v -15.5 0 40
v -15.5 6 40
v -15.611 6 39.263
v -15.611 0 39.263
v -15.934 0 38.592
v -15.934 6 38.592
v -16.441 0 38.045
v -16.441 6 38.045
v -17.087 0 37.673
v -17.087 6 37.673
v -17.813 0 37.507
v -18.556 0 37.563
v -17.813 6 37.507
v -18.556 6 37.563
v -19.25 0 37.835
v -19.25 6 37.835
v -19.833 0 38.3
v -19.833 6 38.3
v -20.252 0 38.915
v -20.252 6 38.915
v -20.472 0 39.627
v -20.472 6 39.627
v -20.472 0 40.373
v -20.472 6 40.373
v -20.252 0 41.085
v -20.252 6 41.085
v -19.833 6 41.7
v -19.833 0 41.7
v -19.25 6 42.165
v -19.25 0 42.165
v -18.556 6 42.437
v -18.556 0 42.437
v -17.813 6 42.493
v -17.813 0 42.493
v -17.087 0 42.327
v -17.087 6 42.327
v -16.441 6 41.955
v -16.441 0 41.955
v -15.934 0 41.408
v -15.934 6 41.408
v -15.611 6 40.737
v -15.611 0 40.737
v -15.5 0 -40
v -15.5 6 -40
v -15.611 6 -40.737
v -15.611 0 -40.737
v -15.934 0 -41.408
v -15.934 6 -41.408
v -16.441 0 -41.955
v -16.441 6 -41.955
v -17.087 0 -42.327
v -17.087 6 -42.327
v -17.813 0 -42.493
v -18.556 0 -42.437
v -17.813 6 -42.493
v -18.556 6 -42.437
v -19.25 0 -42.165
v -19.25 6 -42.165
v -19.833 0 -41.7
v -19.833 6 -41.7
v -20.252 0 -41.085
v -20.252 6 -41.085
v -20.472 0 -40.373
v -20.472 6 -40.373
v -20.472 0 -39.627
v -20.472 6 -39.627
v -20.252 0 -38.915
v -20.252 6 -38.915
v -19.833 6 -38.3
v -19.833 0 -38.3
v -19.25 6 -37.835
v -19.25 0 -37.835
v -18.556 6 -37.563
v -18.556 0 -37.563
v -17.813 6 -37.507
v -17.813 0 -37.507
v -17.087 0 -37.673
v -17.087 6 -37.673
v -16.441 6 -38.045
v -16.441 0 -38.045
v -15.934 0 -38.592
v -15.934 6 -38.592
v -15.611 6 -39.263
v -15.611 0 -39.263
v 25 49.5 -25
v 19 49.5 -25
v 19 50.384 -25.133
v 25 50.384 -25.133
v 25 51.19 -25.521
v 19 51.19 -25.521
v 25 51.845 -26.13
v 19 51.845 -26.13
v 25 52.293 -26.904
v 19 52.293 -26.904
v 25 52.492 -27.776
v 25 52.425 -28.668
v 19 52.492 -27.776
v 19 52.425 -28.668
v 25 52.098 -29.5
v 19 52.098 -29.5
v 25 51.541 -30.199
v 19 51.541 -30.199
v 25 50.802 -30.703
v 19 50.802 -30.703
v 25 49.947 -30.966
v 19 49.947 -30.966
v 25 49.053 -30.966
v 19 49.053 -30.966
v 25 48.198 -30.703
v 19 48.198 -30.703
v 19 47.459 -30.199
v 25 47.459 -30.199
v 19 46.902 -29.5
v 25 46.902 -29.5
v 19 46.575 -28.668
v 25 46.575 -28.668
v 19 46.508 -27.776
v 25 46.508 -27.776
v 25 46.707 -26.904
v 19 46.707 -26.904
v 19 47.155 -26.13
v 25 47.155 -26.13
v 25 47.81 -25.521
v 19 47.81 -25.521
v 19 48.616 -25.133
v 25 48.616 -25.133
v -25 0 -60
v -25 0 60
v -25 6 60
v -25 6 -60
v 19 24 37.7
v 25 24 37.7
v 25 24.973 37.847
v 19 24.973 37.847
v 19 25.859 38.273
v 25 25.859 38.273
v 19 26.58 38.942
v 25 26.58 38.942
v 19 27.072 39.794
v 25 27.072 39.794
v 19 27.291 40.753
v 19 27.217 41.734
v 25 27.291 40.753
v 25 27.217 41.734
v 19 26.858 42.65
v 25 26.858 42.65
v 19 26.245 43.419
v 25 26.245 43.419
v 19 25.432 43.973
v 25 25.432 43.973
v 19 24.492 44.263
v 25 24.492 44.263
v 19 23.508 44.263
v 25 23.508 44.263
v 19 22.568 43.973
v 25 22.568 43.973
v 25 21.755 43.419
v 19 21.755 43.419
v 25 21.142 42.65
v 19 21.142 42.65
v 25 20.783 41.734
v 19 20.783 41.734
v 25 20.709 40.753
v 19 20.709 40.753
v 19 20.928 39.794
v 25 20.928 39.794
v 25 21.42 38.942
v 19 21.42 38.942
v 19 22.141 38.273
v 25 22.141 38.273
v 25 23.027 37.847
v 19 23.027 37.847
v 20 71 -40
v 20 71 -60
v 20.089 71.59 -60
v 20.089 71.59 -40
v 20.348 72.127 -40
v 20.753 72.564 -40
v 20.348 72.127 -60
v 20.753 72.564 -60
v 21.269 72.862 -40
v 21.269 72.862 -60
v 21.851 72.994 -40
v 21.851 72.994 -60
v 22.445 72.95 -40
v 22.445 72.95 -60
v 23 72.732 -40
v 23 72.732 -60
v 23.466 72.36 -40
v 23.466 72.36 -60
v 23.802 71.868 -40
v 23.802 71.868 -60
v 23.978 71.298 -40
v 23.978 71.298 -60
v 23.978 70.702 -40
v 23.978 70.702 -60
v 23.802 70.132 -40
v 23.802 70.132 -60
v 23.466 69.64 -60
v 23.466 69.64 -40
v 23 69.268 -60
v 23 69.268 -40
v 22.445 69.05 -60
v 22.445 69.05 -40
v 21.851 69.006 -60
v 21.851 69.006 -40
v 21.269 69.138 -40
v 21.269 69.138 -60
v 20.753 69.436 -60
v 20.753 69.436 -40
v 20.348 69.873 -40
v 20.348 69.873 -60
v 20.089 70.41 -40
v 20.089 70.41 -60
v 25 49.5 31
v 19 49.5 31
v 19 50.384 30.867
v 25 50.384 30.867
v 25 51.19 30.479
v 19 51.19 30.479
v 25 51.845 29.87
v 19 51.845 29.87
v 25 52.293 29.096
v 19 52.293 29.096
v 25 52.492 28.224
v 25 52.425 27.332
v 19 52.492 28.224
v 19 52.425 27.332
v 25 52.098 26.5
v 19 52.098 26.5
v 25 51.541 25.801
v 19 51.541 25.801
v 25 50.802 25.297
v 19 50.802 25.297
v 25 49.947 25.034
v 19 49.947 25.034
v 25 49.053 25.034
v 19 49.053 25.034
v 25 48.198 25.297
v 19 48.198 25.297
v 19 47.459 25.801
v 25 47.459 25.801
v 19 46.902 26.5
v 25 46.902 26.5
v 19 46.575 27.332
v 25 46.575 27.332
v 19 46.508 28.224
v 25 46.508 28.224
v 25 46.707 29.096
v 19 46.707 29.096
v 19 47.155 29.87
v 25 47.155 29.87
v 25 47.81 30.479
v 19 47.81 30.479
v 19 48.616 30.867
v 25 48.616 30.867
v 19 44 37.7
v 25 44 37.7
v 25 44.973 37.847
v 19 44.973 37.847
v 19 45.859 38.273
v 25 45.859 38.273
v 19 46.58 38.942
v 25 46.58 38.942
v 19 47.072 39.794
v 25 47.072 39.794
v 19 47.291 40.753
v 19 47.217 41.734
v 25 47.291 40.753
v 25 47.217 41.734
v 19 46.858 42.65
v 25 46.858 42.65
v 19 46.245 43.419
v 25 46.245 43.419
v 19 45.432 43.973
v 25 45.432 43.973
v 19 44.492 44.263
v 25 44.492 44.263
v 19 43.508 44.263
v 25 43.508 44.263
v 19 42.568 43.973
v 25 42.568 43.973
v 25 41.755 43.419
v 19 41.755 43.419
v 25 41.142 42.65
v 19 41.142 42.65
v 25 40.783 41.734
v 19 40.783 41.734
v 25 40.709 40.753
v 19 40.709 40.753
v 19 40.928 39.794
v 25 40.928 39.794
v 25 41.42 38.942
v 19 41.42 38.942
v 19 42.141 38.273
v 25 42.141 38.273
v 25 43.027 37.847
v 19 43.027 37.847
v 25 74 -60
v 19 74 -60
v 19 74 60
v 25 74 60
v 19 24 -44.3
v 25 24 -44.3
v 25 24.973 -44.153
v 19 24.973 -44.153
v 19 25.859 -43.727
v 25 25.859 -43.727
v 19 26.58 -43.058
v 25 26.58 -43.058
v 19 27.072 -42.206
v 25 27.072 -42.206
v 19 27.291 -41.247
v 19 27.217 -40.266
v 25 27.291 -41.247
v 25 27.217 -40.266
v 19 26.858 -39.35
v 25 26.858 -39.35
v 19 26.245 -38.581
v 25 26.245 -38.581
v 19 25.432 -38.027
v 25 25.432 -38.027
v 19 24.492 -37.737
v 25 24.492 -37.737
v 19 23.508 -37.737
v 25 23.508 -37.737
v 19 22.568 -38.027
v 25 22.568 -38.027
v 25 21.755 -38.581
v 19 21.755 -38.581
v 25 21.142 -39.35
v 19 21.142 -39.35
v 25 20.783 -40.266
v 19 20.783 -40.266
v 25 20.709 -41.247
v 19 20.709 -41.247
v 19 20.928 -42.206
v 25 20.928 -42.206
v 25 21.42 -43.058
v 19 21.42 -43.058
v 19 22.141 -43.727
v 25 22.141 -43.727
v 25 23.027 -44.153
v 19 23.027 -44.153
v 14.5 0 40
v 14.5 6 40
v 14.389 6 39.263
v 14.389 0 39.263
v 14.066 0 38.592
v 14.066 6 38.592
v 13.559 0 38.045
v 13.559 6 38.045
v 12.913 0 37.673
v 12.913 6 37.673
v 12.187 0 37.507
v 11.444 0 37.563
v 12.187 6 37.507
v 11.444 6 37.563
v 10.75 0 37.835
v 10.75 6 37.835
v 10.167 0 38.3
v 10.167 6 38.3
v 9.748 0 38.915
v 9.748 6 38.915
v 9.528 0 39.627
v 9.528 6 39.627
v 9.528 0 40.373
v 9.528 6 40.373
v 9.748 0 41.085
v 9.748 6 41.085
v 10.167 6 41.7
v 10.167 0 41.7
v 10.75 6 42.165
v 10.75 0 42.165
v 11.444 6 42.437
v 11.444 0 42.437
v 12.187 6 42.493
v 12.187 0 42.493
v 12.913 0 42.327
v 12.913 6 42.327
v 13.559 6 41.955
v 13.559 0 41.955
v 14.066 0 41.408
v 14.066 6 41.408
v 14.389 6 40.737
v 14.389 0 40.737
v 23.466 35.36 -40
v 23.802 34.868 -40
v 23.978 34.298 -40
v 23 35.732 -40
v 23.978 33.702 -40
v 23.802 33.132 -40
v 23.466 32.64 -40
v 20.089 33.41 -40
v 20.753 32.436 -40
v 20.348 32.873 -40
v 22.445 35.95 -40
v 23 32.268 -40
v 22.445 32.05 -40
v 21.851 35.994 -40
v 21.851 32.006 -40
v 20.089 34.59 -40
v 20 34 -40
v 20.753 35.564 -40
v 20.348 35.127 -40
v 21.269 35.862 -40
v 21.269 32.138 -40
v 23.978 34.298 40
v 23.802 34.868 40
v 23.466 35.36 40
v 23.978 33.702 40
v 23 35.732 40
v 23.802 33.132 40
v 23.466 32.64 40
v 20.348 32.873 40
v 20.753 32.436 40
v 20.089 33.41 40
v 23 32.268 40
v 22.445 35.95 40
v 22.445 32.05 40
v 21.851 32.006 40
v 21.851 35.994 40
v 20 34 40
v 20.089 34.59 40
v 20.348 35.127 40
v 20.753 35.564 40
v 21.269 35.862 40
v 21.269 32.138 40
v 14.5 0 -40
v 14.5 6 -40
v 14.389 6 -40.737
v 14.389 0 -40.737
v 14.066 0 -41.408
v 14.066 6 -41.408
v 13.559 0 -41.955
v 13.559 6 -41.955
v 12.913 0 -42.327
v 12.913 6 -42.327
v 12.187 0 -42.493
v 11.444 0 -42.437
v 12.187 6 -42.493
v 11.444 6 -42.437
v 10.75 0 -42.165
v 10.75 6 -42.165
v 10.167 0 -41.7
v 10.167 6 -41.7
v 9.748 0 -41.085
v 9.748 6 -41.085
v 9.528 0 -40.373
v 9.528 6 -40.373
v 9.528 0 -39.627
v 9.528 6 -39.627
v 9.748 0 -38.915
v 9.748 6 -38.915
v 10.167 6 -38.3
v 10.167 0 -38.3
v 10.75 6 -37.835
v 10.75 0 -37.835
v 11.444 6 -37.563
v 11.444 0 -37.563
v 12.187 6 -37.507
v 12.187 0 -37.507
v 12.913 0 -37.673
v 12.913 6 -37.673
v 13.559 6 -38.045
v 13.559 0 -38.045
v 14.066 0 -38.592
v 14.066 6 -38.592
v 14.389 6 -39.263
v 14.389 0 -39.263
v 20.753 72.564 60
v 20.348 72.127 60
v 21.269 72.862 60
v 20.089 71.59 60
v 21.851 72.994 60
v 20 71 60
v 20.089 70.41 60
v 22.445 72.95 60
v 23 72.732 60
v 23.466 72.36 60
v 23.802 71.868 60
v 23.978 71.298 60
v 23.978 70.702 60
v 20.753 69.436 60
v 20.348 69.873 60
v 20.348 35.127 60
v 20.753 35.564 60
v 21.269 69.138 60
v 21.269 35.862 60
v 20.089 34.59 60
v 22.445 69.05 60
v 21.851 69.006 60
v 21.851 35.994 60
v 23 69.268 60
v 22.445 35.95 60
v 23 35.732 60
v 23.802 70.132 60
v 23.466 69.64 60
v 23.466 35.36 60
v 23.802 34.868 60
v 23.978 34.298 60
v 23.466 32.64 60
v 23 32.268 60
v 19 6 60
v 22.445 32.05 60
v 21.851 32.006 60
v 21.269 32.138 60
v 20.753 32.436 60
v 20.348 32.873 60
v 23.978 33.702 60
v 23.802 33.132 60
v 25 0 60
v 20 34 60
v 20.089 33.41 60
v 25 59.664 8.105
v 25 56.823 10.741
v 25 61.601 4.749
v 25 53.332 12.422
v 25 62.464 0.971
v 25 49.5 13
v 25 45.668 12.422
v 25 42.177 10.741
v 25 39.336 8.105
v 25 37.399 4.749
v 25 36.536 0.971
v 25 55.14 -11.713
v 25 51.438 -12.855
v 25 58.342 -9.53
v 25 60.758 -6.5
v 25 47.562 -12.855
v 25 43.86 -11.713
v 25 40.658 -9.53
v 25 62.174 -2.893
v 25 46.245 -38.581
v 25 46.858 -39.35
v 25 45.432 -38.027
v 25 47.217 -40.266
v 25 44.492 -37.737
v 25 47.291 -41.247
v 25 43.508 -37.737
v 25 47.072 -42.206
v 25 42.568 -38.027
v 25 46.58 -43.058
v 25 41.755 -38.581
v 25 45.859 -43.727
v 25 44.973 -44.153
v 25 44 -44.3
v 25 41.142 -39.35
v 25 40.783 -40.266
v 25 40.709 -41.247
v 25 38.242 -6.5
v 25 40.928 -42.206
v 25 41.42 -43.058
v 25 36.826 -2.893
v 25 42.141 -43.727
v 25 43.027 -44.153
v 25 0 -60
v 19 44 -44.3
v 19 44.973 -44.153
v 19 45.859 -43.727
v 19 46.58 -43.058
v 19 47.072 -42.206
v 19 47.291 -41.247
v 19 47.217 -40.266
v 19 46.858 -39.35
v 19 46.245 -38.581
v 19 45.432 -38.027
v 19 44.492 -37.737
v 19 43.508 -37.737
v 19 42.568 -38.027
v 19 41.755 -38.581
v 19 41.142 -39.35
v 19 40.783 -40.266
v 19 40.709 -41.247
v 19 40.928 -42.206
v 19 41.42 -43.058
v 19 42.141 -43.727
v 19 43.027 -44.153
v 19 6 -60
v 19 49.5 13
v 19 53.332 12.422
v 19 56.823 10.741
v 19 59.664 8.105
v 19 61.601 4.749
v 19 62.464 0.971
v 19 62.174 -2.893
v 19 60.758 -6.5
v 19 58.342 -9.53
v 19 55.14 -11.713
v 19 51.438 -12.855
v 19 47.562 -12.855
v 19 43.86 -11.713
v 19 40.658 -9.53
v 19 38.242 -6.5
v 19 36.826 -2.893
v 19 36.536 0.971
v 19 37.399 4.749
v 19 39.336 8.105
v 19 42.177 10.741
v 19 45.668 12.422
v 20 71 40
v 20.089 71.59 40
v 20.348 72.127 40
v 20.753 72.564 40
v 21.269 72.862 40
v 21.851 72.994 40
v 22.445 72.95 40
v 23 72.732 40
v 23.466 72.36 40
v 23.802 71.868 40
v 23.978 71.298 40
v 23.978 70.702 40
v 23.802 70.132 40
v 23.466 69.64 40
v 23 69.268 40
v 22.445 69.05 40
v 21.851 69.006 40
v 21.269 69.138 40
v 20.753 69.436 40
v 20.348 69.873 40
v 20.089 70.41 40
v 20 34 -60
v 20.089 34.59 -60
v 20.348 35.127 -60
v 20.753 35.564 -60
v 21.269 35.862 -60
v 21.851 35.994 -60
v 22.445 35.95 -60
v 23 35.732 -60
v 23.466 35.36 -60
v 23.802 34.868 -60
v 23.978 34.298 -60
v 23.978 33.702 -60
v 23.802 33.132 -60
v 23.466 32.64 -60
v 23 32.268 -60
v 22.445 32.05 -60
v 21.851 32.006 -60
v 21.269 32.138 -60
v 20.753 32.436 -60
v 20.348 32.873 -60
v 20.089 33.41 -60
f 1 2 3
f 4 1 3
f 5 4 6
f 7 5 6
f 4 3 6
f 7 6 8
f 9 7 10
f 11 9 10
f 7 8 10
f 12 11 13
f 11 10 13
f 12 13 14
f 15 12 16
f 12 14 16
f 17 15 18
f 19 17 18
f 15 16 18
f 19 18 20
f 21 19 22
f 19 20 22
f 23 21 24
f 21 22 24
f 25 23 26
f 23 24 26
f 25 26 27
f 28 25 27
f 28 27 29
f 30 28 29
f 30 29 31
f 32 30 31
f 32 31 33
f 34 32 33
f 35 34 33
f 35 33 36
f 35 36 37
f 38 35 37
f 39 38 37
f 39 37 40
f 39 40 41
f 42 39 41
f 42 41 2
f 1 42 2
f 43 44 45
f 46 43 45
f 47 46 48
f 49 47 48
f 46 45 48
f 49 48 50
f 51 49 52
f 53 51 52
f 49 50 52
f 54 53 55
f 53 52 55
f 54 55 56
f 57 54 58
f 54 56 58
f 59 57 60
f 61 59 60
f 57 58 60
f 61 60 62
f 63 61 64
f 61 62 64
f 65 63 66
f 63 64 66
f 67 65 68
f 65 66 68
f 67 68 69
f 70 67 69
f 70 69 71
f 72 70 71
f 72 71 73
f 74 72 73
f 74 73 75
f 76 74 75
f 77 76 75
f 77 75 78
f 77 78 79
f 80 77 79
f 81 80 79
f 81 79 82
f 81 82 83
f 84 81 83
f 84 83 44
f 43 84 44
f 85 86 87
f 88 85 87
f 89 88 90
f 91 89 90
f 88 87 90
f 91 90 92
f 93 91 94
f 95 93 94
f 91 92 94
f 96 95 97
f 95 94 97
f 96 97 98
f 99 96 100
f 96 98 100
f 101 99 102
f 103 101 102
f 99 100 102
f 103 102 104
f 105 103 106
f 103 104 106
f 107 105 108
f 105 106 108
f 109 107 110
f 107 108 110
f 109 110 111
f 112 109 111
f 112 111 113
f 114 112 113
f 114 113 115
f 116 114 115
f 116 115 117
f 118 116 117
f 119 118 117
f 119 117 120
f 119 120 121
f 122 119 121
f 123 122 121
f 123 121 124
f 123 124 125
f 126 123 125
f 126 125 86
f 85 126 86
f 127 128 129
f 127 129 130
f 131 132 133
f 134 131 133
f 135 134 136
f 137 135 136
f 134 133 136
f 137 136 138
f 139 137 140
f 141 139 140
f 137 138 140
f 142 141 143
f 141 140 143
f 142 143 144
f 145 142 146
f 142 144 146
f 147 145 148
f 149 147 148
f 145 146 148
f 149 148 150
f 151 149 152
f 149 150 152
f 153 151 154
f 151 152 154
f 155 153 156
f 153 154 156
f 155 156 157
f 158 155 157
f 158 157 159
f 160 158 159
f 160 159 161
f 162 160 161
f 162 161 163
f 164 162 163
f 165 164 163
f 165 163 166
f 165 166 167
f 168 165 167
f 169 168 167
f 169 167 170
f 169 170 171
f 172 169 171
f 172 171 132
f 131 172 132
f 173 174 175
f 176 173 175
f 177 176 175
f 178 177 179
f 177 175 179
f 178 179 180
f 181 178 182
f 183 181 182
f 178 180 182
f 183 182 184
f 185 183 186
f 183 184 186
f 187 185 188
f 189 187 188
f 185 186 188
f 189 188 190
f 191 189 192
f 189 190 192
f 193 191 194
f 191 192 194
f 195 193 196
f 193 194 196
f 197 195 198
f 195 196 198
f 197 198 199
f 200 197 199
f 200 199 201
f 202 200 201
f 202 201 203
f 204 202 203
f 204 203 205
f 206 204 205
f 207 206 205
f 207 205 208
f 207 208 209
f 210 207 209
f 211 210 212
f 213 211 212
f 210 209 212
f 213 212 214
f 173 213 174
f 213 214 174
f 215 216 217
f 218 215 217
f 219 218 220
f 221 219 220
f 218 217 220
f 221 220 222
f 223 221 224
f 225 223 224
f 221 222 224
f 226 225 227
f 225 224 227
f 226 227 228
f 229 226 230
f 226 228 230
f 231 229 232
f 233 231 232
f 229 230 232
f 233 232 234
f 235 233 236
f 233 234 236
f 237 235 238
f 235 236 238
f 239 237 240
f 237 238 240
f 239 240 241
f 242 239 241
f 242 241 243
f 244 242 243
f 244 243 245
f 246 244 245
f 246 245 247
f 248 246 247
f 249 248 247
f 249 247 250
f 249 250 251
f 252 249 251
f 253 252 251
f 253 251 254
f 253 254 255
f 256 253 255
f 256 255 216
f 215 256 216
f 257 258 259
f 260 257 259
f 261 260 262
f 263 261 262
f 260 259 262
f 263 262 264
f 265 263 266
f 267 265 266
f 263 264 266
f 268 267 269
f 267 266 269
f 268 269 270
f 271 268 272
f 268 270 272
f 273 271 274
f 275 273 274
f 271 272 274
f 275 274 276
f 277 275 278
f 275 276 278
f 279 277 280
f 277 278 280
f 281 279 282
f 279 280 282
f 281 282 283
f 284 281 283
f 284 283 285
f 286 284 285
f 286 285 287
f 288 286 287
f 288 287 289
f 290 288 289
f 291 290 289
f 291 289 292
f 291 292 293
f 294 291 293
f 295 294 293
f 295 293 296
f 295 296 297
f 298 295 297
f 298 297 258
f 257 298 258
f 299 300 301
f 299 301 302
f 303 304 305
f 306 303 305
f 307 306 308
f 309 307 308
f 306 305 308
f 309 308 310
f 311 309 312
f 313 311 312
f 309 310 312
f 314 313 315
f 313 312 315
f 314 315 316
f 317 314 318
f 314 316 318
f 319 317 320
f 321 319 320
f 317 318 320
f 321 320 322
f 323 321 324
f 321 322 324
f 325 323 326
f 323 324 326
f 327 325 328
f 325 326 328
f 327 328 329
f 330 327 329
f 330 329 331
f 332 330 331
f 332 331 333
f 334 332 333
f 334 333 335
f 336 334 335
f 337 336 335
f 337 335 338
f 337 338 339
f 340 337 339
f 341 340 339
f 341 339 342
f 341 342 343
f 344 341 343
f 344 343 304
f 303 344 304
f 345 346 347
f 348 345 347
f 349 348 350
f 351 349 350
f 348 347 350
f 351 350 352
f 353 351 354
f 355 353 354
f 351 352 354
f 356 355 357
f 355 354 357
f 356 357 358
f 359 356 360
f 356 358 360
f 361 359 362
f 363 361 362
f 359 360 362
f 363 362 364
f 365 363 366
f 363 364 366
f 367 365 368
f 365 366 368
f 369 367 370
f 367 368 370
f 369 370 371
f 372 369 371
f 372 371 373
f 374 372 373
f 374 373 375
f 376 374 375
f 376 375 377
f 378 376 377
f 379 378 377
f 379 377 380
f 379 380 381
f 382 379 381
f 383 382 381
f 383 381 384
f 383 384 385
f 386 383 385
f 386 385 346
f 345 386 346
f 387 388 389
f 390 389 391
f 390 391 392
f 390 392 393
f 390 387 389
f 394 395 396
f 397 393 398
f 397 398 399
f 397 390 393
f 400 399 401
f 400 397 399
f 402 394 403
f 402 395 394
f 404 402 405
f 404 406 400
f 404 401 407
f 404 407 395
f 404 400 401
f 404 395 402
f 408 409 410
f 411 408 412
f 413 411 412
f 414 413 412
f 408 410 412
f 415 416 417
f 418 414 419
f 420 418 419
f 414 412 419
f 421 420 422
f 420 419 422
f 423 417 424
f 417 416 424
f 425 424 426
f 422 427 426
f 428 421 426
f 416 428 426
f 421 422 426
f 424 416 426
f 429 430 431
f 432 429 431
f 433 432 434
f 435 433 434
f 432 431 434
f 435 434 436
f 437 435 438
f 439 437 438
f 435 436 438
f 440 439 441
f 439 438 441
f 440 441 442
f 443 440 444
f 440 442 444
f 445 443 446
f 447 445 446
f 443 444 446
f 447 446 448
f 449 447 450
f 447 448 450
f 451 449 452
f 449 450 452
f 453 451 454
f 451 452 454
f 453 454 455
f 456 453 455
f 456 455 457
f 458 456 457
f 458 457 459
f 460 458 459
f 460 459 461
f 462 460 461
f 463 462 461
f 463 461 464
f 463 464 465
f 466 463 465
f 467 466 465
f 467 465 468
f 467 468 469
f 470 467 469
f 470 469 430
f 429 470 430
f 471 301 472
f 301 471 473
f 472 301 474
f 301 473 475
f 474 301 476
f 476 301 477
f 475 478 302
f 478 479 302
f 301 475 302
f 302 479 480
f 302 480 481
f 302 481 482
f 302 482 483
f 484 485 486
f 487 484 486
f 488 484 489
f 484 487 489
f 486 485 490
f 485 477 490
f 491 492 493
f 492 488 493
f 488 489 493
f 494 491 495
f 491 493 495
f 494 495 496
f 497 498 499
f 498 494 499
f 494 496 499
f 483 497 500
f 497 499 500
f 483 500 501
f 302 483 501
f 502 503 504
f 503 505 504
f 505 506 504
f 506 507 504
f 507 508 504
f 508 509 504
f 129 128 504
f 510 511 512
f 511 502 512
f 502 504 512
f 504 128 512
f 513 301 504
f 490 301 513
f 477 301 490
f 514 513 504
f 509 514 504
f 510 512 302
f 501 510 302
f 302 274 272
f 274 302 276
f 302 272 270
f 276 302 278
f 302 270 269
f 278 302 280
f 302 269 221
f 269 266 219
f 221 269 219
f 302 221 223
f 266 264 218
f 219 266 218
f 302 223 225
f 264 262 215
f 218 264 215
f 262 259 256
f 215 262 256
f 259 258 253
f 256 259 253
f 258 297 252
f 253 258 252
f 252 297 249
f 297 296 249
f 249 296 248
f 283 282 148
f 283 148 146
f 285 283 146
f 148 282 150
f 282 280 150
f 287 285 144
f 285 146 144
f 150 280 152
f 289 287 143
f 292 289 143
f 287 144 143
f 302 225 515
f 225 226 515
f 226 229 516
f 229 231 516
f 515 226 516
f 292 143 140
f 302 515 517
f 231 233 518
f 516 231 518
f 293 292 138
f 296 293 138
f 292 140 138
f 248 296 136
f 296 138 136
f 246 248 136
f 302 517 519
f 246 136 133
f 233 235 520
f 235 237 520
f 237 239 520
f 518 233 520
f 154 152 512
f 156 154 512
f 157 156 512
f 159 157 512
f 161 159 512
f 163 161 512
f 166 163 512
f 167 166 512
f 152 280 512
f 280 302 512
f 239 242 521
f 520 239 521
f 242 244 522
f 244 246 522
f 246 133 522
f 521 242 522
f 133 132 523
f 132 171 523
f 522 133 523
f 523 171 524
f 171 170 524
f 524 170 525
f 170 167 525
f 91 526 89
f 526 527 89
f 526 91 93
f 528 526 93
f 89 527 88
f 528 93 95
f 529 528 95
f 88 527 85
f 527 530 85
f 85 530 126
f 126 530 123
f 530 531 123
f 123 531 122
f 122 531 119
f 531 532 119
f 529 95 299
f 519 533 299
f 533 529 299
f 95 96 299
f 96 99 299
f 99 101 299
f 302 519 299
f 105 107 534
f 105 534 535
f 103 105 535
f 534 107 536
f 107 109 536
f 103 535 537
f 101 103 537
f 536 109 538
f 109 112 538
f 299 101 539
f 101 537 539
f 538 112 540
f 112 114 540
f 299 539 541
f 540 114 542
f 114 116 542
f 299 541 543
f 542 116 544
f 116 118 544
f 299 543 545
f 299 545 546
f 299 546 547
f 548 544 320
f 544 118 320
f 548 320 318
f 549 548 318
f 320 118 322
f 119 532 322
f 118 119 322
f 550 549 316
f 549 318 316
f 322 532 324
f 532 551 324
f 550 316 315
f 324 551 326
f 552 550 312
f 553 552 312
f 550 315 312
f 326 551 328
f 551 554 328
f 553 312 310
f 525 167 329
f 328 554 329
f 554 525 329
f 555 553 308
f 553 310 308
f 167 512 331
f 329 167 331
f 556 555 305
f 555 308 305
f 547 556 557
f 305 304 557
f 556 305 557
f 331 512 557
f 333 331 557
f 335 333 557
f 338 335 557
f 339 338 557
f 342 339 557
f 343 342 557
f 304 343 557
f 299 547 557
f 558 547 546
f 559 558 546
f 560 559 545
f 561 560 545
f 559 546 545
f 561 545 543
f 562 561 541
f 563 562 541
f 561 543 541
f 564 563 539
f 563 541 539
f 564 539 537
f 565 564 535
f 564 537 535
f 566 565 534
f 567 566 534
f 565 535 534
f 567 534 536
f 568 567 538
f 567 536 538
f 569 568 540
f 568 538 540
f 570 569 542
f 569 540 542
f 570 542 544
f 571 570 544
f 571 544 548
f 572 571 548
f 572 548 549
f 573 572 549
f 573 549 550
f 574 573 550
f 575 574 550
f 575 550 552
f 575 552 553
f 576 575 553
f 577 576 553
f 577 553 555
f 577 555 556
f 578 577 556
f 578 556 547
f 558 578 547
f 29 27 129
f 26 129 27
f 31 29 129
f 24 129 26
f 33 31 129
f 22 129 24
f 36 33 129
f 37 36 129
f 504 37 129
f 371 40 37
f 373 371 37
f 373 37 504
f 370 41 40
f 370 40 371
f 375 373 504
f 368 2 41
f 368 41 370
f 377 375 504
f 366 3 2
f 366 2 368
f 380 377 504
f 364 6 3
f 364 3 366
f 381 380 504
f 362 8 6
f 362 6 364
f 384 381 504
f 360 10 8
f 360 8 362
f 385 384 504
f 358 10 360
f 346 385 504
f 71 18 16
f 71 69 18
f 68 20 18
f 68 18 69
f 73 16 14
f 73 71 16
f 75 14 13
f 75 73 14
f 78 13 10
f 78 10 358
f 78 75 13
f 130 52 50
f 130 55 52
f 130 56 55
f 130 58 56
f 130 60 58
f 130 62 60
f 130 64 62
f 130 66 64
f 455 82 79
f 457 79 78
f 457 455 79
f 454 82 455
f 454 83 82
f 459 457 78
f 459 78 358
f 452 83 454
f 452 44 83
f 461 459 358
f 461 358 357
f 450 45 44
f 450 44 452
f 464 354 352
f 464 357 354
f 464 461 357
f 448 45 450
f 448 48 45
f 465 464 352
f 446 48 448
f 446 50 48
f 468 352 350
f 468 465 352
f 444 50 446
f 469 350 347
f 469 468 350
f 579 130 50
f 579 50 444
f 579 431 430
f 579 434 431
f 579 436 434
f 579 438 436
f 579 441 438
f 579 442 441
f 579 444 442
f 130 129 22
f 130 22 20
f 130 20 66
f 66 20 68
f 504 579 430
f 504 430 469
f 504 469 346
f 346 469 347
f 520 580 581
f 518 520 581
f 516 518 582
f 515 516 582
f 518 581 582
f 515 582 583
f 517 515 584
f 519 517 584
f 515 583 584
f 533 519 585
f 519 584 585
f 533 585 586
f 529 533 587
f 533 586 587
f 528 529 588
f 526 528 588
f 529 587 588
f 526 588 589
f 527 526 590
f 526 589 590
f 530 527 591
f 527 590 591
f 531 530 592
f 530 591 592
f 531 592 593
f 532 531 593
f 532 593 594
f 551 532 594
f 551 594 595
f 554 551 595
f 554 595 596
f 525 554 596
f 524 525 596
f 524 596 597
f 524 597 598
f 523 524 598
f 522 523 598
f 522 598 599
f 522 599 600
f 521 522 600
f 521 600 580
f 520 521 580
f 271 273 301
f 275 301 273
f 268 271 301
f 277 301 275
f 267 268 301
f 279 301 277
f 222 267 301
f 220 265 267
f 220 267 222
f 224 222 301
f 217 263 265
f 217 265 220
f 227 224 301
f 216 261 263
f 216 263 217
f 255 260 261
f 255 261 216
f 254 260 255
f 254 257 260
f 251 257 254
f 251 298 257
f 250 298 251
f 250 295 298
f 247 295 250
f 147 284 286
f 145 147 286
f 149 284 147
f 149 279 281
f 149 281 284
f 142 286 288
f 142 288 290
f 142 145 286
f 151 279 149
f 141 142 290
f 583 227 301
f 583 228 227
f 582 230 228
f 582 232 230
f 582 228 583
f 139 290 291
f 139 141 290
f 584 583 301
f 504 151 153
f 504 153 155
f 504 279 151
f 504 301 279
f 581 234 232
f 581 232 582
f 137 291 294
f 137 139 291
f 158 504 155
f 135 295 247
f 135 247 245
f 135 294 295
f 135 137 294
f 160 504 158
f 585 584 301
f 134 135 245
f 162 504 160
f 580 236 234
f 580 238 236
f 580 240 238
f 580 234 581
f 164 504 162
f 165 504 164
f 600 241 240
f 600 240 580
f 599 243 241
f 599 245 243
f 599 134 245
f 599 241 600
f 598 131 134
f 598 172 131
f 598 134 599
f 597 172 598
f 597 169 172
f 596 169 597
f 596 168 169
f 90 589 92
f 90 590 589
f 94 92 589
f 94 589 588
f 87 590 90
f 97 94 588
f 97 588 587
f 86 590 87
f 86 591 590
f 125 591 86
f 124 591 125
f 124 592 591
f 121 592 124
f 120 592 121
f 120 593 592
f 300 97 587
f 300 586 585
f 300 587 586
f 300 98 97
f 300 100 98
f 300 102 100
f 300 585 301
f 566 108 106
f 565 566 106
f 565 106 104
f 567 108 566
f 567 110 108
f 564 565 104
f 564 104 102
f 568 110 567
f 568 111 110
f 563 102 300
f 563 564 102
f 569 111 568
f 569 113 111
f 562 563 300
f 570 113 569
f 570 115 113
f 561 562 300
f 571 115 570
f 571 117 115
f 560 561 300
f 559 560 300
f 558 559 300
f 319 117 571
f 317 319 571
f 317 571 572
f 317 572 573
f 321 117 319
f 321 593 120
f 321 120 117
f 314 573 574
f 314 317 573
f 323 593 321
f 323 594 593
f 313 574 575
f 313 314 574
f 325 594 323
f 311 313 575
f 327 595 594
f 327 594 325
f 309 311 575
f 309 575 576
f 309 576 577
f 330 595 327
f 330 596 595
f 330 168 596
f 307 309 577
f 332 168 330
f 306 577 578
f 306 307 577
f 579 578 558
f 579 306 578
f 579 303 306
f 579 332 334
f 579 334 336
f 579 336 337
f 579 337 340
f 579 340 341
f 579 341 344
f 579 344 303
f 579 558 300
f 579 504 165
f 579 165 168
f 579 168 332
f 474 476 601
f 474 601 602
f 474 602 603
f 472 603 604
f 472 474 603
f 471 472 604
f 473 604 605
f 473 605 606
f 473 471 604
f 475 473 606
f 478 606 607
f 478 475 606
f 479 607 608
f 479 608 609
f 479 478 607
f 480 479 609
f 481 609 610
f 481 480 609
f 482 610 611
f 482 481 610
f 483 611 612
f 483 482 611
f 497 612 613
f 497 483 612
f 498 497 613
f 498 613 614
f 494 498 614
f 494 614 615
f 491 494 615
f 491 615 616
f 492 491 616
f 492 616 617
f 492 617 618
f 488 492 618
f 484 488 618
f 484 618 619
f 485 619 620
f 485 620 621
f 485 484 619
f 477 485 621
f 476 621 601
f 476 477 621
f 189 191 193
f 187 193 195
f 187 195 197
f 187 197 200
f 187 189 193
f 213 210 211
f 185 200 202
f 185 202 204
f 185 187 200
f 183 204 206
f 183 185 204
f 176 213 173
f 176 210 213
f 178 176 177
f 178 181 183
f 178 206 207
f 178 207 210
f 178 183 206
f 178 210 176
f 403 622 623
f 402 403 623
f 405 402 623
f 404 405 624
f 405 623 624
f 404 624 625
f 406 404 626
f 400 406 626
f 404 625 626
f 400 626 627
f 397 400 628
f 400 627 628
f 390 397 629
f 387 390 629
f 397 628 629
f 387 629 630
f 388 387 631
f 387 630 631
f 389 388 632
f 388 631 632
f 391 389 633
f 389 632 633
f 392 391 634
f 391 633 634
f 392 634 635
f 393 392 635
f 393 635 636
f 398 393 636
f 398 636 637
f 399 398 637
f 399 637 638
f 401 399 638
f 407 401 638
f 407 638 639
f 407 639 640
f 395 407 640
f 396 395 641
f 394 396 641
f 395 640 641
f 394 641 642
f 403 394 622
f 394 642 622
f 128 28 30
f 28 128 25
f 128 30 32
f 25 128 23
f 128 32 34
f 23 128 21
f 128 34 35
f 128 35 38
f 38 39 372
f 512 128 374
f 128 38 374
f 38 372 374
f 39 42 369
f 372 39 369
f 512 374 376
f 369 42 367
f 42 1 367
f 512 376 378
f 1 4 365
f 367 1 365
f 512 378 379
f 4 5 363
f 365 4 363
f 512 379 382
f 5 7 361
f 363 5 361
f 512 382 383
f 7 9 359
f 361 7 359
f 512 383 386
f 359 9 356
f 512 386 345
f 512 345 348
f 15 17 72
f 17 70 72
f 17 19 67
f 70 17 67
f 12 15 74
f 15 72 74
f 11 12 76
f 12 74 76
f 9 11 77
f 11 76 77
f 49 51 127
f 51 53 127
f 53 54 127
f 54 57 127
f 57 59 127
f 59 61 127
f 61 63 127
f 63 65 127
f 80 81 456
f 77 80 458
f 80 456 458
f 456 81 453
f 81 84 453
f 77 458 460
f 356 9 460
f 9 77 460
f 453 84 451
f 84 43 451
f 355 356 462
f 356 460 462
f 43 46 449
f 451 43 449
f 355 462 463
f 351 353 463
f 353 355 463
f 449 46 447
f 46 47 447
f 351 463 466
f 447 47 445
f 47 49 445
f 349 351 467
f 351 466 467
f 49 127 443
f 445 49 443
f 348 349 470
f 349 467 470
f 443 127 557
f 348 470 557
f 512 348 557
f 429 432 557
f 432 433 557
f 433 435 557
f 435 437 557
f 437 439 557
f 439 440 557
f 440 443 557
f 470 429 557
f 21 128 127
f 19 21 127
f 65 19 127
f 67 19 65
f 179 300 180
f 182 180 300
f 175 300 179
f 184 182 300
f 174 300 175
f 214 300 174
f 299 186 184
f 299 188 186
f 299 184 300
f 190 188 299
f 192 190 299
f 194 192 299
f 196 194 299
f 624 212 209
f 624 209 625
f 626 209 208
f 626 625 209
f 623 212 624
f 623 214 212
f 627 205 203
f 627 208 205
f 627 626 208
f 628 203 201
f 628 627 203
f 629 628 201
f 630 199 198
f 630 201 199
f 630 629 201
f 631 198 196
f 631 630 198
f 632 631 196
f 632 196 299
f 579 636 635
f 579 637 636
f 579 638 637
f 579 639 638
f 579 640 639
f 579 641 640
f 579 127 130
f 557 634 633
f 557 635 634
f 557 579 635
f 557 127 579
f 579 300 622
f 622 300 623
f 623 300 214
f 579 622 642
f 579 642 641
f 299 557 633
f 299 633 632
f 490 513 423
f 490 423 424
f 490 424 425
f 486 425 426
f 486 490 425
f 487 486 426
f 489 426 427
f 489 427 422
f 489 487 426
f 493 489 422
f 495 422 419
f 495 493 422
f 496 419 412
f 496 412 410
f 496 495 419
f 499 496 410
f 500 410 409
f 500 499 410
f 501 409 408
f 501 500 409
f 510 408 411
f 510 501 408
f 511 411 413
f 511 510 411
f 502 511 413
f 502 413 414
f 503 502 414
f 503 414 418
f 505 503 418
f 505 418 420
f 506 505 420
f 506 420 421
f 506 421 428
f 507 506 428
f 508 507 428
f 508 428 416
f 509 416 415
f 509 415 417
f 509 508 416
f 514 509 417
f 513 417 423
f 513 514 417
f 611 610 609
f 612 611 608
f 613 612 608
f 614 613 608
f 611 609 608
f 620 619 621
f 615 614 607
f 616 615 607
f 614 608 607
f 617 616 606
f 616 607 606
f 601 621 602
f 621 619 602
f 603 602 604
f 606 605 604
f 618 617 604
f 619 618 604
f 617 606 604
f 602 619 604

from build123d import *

# Parameters (mm, degrees)
SKETCH_1_W          = 44
SKETCH_1_H          = 120
EXTRUDE_1_DEPTH     = 6
SKETCH_1_3_W        = 6
SKETCH_1_3_H        = 120
EXTRUDE_2_DEPTH     = 74
SKETCH_2_R          = 13
SKETCH_2_R_2        = 3
CUT_EXTRUDE_1_DEPTH = 7
SKETCH_3_R          = 2.5
CUT_EXTRUDE_2_DEPTH = 10
SKETCH_4_R          = 2
CUT_EXTRUDE_3_DEPTH = 20
SKETCH_5_R          = 3.3
CUT_EXTRUDE_4_DEPTH = 10


with BuildPart() as part:
    # 草图1 → 凸台-拉伸1 (new body)
    with BuildSketch(Plane(origin=(0, 0, 0), x_dir=(1, 0, 0), z_dir=(0, 1, 0))):
        with Locations((-3, 0)):
            Rectangle(SKETCH_1_W, SKETCH_1_H)
    extrude(amount=EXTRUDE_1_DEPTH)

    # 草图1<3> → 凸台-拉伸2 (add)
    with BuildSketch(Plane(origin=(0, 0, 0), x_dir=(1, 0, 0), z_dir=(0, 1, 0))):
        with Locations((22, 0)):
            Rectangle(SKETCH_1_3_W, SKETCH_1_3_H)
    extrude(amount=EXTRUDE_2_DEPTH)

    # 草图2 → 切除-拉伸1 (cut, through all)
    with BuildSketch(Plane.ZY.offset(-19)):
        with Locations((0, 49.5)):
            Circle(SKETCH_2_R)
        with Locations((-28, 49.5)):
            Circle(SKETCH_2_R_2)
        with Locations((28, 49.5)):
            Circle(SKETCH_2_R_2)
    extrude(amount=-CUT_EXTRUDE_1_DEPTH, mode=Mode.SUBTRACT)

    # 草图3 → 切除-拉伸2 (cut)
    with BuildSketch(Plane(origin=(0, 6, 0), x_dir=(1, 0, 0), z_dir=(0, 1, 0))):
        with Locations((-18, 40)):
            Circle(SKETCH_3_R)
        with Locations((12, 40)):
            Circle(SKETCH_3_R)
        with Locations((-18, -40)):
            Circle(SKETCH_3_R)
        with Locations((12, -40)):
            Circle(SKETCH_3_R)
    extrude(amount=-CUT_EXTRUDE_2_DEPTH, mode=Mode.SUBTRACT)

    # 草图4 → 切除-拉伸3 (cut)
    with BuildSketch(Plane(origin=(0, 0, -60), x_dir=(-1, 0, 0), z_dir=(0, 0, -1))):
        with Locations((-22, 34)):
            Circle(SKETCH_4_R)
        with Locations((-22, 71)):
            Circle(SKETCH_4_R)
    cut_extrude_3 = extrude(amount=-CUT_EXTRUDE_3_DEPTH, mode=Mode.SUBTRACT)

    # 镜向1: 切除-拉伸3 across plane
    add(cut_extrude_3.mirror(Plane(origin=(0, 0, 0), x_dir=(1, 0, 0), z_dir=(0, 0, -1))), mode=Mode.SUBTRACT)

    # 草图5 → 切除-拉伸4 (cut)
    with BuildSketch(Plane(origin=(25, 0, 0), x_dir=(0, 0, -1), z_dir=(1, 0, 0))):
        with Locations((41, 44)):
            Circle(SKETCH_5_R)
        with Locations((41, 24)):
            Circle(SKETCH_5_R)
        with Locations((-41, 24)):
            Circle(SKETCH_5_R)
        with Locations((-41, 44)):
            Circle(SKETCH_5_R)
    extrude(amount=-CUT_EXTRUDE_4_DEPTH, mode=Mode.SUBTRACT)


solid = part.part
